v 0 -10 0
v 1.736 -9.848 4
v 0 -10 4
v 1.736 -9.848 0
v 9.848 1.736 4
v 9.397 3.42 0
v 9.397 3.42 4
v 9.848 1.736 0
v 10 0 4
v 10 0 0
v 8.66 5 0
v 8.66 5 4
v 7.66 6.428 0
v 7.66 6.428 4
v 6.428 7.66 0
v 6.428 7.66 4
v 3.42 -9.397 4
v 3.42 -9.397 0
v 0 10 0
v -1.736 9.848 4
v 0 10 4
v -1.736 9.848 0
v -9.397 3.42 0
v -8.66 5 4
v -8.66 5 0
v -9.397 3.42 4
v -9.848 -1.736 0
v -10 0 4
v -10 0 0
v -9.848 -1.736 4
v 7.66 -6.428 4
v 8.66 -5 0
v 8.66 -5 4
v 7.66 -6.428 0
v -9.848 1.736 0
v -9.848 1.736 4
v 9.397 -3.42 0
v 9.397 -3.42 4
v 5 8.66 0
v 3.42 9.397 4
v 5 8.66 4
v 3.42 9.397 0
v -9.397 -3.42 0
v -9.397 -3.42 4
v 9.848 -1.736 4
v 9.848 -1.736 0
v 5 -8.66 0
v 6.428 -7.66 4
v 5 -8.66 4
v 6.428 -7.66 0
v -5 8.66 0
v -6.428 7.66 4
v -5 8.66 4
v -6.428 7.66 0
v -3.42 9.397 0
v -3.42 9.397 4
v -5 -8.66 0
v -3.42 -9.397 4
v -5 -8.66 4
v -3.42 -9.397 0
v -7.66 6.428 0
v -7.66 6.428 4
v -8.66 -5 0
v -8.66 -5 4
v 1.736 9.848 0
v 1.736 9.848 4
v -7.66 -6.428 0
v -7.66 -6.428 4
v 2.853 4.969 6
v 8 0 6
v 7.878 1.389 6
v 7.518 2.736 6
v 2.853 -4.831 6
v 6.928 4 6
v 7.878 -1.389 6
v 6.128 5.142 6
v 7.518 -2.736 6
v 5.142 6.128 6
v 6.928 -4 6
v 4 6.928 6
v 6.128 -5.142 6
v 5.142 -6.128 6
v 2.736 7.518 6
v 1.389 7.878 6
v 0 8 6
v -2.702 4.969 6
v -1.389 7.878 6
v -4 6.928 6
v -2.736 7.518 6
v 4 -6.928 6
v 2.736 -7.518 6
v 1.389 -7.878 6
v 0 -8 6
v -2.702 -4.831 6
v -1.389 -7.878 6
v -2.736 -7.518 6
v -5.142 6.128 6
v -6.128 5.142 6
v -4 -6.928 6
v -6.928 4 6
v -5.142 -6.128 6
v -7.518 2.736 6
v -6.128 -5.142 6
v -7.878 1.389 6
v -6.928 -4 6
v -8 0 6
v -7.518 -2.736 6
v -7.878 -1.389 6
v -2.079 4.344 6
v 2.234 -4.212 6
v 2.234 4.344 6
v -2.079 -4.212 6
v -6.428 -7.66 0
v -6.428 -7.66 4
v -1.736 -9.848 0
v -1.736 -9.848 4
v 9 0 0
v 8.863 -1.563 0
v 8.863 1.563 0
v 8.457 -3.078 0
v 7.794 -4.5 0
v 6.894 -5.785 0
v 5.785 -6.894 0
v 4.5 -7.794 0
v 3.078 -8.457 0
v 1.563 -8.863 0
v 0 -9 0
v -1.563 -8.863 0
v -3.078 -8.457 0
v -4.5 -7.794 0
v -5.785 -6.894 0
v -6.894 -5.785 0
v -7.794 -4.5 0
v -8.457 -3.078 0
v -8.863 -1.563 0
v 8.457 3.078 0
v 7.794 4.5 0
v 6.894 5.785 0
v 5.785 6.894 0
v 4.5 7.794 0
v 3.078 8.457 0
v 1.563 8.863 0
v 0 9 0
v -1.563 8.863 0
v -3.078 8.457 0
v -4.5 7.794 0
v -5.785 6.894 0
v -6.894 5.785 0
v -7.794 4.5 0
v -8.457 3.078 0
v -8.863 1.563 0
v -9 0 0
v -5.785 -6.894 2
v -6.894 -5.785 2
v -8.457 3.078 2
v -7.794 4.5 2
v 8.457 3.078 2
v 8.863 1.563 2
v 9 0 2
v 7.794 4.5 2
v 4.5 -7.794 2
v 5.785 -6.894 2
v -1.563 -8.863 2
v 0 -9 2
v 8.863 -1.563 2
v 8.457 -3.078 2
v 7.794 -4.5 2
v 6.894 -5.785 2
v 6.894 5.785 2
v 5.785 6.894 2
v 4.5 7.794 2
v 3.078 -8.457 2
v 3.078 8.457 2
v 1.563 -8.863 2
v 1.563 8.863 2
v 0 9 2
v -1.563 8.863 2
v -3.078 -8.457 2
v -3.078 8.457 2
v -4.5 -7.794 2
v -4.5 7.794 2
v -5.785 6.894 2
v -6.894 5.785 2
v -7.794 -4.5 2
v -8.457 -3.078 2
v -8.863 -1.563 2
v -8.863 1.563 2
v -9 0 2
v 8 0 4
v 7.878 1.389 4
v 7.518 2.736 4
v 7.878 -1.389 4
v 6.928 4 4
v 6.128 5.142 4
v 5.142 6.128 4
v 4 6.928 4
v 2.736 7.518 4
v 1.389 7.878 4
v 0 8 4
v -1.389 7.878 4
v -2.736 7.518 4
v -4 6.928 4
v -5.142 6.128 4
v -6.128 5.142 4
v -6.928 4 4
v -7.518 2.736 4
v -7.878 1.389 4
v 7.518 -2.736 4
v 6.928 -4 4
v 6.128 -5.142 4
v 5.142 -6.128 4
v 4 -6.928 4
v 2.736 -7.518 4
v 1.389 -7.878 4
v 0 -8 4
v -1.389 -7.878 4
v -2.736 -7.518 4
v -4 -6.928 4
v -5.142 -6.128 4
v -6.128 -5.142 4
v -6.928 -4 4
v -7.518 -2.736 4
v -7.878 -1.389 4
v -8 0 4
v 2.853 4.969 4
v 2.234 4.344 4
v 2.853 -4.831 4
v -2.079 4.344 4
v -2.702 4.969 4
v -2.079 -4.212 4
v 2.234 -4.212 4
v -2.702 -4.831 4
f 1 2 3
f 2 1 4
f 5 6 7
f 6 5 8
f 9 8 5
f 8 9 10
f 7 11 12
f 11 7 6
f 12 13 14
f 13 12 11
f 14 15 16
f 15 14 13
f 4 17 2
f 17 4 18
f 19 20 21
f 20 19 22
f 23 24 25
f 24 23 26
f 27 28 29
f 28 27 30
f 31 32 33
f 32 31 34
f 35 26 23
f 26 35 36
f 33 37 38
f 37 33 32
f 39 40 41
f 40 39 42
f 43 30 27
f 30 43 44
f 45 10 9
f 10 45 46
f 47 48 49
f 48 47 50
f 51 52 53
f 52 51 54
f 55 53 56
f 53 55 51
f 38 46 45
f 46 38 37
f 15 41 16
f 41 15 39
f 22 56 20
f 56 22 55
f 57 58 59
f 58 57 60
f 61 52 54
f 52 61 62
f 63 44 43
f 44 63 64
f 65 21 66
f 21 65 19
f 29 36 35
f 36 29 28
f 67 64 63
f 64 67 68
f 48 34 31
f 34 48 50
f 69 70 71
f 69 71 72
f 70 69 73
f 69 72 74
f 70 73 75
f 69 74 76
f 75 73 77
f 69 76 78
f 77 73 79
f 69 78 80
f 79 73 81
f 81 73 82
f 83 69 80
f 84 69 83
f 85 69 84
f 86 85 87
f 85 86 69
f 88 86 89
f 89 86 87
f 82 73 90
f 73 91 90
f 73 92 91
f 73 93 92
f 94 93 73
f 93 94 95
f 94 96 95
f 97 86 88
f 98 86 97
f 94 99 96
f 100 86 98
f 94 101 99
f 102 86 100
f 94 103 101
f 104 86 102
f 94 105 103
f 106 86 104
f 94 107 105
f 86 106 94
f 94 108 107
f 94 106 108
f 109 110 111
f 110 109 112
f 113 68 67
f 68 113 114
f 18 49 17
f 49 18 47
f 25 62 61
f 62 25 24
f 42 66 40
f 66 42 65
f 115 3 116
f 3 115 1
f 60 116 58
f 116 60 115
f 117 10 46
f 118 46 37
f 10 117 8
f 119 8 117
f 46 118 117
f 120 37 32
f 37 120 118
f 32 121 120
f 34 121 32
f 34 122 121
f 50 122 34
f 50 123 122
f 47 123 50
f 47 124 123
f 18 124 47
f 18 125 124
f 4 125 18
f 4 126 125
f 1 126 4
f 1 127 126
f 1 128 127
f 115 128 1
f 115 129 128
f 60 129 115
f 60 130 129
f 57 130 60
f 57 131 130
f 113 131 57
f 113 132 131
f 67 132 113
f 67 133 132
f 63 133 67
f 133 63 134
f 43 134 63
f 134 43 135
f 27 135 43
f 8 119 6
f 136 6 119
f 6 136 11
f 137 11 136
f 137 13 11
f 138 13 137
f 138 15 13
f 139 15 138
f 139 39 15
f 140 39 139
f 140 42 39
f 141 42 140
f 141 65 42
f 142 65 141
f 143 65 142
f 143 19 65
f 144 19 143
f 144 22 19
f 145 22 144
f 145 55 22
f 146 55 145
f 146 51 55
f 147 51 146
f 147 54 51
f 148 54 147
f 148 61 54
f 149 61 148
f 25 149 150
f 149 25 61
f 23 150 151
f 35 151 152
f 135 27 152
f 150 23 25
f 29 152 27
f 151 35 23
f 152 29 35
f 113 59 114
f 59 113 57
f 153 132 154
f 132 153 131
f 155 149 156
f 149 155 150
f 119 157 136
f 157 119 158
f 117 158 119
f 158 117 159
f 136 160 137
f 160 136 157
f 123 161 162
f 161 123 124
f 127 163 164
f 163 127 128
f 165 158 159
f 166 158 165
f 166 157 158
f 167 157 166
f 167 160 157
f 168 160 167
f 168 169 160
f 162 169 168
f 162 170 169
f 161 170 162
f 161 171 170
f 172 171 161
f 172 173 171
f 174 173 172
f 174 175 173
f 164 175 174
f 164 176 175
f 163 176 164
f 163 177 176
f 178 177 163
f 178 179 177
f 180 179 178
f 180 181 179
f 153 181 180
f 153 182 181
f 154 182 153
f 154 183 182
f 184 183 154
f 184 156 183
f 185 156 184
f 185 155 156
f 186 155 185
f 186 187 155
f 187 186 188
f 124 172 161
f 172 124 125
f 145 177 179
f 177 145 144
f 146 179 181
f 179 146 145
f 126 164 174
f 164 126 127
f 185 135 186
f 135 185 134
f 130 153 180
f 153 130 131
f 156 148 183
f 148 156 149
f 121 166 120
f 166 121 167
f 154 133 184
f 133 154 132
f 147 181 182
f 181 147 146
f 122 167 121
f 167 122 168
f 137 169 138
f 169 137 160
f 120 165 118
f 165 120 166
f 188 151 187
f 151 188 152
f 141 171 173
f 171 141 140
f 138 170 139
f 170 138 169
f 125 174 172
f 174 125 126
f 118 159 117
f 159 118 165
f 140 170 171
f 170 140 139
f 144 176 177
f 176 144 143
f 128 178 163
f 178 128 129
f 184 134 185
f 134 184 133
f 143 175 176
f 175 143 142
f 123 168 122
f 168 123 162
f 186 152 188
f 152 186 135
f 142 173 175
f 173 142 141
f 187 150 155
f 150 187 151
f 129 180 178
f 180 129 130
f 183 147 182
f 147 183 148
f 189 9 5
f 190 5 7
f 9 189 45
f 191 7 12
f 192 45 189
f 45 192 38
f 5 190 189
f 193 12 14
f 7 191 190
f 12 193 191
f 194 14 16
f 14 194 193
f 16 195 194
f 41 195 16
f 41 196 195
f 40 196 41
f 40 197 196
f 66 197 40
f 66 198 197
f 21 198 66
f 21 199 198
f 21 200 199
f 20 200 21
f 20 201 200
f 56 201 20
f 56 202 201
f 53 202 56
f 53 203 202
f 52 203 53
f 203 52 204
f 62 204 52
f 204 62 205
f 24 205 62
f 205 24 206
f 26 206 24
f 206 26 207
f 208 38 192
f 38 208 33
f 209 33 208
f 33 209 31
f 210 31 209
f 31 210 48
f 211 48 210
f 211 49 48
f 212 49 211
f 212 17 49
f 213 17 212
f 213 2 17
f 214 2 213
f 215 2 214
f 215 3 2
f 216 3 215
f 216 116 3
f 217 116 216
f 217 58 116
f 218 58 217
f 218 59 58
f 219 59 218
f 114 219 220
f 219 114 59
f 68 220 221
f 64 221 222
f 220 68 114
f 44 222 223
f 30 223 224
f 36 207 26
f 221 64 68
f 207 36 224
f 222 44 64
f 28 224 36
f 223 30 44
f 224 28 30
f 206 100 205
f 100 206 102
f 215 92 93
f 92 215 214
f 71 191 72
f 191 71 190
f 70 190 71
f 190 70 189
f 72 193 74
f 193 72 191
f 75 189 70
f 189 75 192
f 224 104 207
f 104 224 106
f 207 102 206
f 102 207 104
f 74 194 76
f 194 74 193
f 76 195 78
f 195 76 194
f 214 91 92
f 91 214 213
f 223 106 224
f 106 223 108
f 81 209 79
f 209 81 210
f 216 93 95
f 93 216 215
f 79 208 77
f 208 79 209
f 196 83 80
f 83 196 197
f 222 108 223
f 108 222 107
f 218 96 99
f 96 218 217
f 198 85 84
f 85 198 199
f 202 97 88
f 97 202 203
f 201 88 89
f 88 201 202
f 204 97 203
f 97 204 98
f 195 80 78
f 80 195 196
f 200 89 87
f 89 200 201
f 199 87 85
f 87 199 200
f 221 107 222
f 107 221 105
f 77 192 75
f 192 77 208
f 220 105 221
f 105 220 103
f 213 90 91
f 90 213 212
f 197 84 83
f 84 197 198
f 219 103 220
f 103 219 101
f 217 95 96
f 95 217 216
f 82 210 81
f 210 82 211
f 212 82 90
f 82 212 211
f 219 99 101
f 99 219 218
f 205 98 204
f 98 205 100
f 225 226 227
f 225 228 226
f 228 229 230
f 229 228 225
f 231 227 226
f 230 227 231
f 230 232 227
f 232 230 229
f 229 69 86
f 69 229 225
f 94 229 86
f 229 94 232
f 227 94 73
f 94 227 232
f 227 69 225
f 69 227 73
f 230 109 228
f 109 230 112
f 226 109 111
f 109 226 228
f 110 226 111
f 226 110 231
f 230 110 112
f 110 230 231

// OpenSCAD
difference() {
	difference() {
		difference() {
			cylinder($fn = 36, h = 6, r = 10);
			translate(v = [0, 0, -1]) {
				cylinder($fn = 36, h = 3, r = 9);
			}
		}
		translate(v = [0, 0, 4]) {
			difference() {
				cylinder($fn = 36, h = 3, r = 10.5000000000);
				cylinder($fn = 36, h = 3, r = 8);
			}
		}
	}
	translate(v = [0, 0, 4]) {
		linear_extrude(height = 3) {
			text(font = "mana", halign = "center", size = 8, text = "\uE601", valign = "center");
		}
	}
}
